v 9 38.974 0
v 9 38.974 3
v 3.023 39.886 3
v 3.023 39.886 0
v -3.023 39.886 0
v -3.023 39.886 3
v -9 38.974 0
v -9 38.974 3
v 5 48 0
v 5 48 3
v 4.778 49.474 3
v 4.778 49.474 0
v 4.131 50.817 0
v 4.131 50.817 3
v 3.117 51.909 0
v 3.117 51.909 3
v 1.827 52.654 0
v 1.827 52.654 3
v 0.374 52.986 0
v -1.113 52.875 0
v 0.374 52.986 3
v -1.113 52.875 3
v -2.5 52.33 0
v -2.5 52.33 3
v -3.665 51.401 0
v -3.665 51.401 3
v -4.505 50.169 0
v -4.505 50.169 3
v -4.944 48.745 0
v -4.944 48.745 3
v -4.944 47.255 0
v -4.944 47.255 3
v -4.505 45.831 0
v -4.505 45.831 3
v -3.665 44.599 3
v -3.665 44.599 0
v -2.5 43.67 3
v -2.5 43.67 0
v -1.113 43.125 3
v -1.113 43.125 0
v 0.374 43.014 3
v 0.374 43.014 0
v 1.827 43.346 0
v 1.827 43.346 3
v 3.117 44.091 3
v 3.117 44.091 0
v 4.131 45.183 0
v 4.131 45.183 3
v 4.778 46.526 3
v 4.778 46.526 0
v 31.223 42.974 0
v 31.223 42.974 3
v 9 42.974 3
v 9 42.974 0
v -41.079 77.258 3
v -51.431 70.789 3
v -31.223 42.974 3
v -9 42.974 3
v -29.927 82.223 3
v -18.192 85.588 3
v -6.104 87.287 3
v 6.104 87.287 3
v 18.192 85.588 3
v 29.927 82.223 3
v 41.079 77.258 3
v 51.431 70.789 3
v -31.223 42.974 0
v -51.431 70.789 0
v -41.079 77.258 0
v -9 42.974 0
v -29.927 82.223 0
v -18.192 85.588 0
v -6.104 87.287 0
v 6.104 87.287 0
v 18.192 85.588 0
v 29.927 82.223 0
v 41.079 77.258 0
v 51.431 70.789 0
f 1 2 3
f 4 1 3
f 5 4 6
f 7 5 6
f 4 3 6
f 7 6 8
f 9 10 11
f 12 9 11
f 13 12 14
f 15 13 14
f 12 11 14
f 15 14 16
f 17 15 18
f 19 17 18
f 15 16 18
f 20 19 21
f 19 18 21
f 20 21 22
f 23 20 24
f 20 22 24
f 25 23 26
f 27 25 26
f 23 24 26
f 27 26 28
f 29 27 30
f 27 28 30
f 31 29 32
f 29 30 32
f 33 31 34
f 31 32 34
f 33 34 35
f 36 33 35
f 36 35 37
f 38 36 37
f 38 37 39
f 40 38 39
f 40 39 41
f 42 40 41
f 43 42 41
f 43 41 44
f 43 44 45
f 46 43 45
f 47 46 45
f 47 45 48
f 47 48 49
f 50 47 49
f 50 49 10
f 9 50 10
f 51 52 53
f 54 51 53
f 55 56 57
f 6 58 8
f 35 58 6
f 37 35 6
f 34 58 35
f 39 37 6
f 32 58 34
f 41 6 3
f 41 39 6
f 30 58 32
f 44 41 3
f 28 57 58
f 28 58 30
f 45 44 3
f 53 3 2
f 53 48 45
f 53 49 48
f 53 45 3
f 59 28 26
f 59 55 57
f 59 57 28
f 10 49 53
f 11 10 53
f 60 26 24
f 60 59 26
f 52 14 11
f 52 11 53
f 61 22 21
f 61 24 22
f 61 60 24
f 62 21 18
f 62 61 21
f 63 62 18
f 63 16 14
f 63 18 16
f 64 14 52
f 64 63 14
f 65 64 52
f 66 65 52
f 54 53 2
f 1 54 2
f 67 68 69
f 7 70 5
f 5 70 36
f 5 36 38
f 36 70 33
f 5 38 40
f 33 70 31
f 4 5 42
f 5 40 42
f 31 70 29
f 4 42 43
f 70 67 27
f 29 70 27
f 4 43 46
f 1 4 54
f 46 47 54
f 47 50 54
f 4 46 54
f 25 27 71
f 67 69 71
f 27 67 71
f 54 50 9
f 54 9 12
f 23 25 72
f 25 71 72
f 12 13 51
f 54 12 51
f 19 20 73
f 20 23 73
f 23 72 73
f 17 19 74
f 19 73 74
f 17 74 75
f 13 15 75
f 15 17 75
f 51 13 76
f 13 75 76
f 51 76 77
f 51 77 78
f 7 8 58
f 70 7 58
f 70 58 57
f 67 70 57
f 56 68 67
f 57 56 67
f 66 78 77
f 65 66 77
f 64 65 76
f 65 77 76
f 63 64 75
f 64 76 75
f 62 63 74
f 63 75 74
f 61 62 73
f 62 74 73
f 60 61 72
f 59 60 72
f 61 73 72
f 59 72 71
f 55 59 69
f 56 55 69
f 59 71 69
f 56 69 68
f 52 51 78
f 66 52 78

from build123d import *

# Parameters (mm, degrees)
F1_DEPTH = 3
F3_DEPTH = 3.001
F4_R     = 5
F5_DEPTH = 3.001
F7_DEPTH = 3.001
F9_DEPTH = 3.001


with BuildPart() as f1:
    # F0 (on Top) → F1 (new body)
    with BuildSketch(Plane.XY):
        with BuildLine():
            Line((0, 0), (51.4312095756, 70.7889870078))
            ThreePointArc((51.4312095756, 70.7889870078), (0, 87.5), (-51.4312095756, 70.7889870078))
            Line((-51.4312095756, 70.7889870078), (0, 0))
        make_face()
    extrude(amount=F1_DEPTH)

    # F2 (on face) → F3 (cut, through all)
    with BuildSketch(Plane.XY.offset(3)):
        with BuildLine():
            Line((0, 0), (23.5114100917, 32.360679775))
            ThreePointArc((23.5114100917, 32.360679775), (0, 40), (-23.5114100917, 32.360679775))
            Line((-23.5114100917, 32.360679775), (0, 0))
        make_face()
    extrude(amount=-F3_DEPTH, mode=Mode.SUBTRACT)

    # F4 (on face) → F5 (cut, through all)
    with BuildSketch(Plane.XY.offset(3)):
        with Locations((0, 48)):
            Circle(F4_R)
    extrude(amount=-F5_DEPTH, mode=Mode.SUBTRACT)

    # F6 (on face) → F7 (cut, through all)
    with BuildSketch(Plane.XY.offset(3)):
        with BuildLine():
            ThreePointArc((-23.5114100917, 32.360679775), (-16.5886439103, 36.3980341944), (-9, 38.9743505398))
            Line((-9, 38.9743505398), (-28.3165231686, 38.9743505398))
            Line((-28.3165231686, 38.9743505398), (-23.5114100917, 32.360679775))
        make_face()
        with BuildLine():
            Line((28.3165231686, 38.9743505398), (9, 38.9743505398))
            ThreePointArc((9, 38.9743505398), (16.5886439103, 36.3980341944), (23.5114100917, 32.360679775))
            Line((23.5114100917, 32.360679775), (28.3165231686, 38.9743505398))
        make_face()
    extrude(amount=-F7_DEPTH, mode=Mode.SUBTRACT)

    # F8 (on face) → F9 (cut, through all)
    with BuildSketch(Plane.XY.offset(3)):
        Polygon((-28.3165231686, 38.9743505398), (-9, 38.9743505398), (-9, 42.9743505398), (-31.2226932806, 42.9743505398), align=None)
        Polygon((9, 42.9743505398), (9, 38.9743505398), (28.3165231686, 38.9743505398), (31.2226932806, 42.9743505398), align=None)
    extrude(amount=-F9_DEPTH, mode=Mode.SUBTRACT)


solid = f1.part
